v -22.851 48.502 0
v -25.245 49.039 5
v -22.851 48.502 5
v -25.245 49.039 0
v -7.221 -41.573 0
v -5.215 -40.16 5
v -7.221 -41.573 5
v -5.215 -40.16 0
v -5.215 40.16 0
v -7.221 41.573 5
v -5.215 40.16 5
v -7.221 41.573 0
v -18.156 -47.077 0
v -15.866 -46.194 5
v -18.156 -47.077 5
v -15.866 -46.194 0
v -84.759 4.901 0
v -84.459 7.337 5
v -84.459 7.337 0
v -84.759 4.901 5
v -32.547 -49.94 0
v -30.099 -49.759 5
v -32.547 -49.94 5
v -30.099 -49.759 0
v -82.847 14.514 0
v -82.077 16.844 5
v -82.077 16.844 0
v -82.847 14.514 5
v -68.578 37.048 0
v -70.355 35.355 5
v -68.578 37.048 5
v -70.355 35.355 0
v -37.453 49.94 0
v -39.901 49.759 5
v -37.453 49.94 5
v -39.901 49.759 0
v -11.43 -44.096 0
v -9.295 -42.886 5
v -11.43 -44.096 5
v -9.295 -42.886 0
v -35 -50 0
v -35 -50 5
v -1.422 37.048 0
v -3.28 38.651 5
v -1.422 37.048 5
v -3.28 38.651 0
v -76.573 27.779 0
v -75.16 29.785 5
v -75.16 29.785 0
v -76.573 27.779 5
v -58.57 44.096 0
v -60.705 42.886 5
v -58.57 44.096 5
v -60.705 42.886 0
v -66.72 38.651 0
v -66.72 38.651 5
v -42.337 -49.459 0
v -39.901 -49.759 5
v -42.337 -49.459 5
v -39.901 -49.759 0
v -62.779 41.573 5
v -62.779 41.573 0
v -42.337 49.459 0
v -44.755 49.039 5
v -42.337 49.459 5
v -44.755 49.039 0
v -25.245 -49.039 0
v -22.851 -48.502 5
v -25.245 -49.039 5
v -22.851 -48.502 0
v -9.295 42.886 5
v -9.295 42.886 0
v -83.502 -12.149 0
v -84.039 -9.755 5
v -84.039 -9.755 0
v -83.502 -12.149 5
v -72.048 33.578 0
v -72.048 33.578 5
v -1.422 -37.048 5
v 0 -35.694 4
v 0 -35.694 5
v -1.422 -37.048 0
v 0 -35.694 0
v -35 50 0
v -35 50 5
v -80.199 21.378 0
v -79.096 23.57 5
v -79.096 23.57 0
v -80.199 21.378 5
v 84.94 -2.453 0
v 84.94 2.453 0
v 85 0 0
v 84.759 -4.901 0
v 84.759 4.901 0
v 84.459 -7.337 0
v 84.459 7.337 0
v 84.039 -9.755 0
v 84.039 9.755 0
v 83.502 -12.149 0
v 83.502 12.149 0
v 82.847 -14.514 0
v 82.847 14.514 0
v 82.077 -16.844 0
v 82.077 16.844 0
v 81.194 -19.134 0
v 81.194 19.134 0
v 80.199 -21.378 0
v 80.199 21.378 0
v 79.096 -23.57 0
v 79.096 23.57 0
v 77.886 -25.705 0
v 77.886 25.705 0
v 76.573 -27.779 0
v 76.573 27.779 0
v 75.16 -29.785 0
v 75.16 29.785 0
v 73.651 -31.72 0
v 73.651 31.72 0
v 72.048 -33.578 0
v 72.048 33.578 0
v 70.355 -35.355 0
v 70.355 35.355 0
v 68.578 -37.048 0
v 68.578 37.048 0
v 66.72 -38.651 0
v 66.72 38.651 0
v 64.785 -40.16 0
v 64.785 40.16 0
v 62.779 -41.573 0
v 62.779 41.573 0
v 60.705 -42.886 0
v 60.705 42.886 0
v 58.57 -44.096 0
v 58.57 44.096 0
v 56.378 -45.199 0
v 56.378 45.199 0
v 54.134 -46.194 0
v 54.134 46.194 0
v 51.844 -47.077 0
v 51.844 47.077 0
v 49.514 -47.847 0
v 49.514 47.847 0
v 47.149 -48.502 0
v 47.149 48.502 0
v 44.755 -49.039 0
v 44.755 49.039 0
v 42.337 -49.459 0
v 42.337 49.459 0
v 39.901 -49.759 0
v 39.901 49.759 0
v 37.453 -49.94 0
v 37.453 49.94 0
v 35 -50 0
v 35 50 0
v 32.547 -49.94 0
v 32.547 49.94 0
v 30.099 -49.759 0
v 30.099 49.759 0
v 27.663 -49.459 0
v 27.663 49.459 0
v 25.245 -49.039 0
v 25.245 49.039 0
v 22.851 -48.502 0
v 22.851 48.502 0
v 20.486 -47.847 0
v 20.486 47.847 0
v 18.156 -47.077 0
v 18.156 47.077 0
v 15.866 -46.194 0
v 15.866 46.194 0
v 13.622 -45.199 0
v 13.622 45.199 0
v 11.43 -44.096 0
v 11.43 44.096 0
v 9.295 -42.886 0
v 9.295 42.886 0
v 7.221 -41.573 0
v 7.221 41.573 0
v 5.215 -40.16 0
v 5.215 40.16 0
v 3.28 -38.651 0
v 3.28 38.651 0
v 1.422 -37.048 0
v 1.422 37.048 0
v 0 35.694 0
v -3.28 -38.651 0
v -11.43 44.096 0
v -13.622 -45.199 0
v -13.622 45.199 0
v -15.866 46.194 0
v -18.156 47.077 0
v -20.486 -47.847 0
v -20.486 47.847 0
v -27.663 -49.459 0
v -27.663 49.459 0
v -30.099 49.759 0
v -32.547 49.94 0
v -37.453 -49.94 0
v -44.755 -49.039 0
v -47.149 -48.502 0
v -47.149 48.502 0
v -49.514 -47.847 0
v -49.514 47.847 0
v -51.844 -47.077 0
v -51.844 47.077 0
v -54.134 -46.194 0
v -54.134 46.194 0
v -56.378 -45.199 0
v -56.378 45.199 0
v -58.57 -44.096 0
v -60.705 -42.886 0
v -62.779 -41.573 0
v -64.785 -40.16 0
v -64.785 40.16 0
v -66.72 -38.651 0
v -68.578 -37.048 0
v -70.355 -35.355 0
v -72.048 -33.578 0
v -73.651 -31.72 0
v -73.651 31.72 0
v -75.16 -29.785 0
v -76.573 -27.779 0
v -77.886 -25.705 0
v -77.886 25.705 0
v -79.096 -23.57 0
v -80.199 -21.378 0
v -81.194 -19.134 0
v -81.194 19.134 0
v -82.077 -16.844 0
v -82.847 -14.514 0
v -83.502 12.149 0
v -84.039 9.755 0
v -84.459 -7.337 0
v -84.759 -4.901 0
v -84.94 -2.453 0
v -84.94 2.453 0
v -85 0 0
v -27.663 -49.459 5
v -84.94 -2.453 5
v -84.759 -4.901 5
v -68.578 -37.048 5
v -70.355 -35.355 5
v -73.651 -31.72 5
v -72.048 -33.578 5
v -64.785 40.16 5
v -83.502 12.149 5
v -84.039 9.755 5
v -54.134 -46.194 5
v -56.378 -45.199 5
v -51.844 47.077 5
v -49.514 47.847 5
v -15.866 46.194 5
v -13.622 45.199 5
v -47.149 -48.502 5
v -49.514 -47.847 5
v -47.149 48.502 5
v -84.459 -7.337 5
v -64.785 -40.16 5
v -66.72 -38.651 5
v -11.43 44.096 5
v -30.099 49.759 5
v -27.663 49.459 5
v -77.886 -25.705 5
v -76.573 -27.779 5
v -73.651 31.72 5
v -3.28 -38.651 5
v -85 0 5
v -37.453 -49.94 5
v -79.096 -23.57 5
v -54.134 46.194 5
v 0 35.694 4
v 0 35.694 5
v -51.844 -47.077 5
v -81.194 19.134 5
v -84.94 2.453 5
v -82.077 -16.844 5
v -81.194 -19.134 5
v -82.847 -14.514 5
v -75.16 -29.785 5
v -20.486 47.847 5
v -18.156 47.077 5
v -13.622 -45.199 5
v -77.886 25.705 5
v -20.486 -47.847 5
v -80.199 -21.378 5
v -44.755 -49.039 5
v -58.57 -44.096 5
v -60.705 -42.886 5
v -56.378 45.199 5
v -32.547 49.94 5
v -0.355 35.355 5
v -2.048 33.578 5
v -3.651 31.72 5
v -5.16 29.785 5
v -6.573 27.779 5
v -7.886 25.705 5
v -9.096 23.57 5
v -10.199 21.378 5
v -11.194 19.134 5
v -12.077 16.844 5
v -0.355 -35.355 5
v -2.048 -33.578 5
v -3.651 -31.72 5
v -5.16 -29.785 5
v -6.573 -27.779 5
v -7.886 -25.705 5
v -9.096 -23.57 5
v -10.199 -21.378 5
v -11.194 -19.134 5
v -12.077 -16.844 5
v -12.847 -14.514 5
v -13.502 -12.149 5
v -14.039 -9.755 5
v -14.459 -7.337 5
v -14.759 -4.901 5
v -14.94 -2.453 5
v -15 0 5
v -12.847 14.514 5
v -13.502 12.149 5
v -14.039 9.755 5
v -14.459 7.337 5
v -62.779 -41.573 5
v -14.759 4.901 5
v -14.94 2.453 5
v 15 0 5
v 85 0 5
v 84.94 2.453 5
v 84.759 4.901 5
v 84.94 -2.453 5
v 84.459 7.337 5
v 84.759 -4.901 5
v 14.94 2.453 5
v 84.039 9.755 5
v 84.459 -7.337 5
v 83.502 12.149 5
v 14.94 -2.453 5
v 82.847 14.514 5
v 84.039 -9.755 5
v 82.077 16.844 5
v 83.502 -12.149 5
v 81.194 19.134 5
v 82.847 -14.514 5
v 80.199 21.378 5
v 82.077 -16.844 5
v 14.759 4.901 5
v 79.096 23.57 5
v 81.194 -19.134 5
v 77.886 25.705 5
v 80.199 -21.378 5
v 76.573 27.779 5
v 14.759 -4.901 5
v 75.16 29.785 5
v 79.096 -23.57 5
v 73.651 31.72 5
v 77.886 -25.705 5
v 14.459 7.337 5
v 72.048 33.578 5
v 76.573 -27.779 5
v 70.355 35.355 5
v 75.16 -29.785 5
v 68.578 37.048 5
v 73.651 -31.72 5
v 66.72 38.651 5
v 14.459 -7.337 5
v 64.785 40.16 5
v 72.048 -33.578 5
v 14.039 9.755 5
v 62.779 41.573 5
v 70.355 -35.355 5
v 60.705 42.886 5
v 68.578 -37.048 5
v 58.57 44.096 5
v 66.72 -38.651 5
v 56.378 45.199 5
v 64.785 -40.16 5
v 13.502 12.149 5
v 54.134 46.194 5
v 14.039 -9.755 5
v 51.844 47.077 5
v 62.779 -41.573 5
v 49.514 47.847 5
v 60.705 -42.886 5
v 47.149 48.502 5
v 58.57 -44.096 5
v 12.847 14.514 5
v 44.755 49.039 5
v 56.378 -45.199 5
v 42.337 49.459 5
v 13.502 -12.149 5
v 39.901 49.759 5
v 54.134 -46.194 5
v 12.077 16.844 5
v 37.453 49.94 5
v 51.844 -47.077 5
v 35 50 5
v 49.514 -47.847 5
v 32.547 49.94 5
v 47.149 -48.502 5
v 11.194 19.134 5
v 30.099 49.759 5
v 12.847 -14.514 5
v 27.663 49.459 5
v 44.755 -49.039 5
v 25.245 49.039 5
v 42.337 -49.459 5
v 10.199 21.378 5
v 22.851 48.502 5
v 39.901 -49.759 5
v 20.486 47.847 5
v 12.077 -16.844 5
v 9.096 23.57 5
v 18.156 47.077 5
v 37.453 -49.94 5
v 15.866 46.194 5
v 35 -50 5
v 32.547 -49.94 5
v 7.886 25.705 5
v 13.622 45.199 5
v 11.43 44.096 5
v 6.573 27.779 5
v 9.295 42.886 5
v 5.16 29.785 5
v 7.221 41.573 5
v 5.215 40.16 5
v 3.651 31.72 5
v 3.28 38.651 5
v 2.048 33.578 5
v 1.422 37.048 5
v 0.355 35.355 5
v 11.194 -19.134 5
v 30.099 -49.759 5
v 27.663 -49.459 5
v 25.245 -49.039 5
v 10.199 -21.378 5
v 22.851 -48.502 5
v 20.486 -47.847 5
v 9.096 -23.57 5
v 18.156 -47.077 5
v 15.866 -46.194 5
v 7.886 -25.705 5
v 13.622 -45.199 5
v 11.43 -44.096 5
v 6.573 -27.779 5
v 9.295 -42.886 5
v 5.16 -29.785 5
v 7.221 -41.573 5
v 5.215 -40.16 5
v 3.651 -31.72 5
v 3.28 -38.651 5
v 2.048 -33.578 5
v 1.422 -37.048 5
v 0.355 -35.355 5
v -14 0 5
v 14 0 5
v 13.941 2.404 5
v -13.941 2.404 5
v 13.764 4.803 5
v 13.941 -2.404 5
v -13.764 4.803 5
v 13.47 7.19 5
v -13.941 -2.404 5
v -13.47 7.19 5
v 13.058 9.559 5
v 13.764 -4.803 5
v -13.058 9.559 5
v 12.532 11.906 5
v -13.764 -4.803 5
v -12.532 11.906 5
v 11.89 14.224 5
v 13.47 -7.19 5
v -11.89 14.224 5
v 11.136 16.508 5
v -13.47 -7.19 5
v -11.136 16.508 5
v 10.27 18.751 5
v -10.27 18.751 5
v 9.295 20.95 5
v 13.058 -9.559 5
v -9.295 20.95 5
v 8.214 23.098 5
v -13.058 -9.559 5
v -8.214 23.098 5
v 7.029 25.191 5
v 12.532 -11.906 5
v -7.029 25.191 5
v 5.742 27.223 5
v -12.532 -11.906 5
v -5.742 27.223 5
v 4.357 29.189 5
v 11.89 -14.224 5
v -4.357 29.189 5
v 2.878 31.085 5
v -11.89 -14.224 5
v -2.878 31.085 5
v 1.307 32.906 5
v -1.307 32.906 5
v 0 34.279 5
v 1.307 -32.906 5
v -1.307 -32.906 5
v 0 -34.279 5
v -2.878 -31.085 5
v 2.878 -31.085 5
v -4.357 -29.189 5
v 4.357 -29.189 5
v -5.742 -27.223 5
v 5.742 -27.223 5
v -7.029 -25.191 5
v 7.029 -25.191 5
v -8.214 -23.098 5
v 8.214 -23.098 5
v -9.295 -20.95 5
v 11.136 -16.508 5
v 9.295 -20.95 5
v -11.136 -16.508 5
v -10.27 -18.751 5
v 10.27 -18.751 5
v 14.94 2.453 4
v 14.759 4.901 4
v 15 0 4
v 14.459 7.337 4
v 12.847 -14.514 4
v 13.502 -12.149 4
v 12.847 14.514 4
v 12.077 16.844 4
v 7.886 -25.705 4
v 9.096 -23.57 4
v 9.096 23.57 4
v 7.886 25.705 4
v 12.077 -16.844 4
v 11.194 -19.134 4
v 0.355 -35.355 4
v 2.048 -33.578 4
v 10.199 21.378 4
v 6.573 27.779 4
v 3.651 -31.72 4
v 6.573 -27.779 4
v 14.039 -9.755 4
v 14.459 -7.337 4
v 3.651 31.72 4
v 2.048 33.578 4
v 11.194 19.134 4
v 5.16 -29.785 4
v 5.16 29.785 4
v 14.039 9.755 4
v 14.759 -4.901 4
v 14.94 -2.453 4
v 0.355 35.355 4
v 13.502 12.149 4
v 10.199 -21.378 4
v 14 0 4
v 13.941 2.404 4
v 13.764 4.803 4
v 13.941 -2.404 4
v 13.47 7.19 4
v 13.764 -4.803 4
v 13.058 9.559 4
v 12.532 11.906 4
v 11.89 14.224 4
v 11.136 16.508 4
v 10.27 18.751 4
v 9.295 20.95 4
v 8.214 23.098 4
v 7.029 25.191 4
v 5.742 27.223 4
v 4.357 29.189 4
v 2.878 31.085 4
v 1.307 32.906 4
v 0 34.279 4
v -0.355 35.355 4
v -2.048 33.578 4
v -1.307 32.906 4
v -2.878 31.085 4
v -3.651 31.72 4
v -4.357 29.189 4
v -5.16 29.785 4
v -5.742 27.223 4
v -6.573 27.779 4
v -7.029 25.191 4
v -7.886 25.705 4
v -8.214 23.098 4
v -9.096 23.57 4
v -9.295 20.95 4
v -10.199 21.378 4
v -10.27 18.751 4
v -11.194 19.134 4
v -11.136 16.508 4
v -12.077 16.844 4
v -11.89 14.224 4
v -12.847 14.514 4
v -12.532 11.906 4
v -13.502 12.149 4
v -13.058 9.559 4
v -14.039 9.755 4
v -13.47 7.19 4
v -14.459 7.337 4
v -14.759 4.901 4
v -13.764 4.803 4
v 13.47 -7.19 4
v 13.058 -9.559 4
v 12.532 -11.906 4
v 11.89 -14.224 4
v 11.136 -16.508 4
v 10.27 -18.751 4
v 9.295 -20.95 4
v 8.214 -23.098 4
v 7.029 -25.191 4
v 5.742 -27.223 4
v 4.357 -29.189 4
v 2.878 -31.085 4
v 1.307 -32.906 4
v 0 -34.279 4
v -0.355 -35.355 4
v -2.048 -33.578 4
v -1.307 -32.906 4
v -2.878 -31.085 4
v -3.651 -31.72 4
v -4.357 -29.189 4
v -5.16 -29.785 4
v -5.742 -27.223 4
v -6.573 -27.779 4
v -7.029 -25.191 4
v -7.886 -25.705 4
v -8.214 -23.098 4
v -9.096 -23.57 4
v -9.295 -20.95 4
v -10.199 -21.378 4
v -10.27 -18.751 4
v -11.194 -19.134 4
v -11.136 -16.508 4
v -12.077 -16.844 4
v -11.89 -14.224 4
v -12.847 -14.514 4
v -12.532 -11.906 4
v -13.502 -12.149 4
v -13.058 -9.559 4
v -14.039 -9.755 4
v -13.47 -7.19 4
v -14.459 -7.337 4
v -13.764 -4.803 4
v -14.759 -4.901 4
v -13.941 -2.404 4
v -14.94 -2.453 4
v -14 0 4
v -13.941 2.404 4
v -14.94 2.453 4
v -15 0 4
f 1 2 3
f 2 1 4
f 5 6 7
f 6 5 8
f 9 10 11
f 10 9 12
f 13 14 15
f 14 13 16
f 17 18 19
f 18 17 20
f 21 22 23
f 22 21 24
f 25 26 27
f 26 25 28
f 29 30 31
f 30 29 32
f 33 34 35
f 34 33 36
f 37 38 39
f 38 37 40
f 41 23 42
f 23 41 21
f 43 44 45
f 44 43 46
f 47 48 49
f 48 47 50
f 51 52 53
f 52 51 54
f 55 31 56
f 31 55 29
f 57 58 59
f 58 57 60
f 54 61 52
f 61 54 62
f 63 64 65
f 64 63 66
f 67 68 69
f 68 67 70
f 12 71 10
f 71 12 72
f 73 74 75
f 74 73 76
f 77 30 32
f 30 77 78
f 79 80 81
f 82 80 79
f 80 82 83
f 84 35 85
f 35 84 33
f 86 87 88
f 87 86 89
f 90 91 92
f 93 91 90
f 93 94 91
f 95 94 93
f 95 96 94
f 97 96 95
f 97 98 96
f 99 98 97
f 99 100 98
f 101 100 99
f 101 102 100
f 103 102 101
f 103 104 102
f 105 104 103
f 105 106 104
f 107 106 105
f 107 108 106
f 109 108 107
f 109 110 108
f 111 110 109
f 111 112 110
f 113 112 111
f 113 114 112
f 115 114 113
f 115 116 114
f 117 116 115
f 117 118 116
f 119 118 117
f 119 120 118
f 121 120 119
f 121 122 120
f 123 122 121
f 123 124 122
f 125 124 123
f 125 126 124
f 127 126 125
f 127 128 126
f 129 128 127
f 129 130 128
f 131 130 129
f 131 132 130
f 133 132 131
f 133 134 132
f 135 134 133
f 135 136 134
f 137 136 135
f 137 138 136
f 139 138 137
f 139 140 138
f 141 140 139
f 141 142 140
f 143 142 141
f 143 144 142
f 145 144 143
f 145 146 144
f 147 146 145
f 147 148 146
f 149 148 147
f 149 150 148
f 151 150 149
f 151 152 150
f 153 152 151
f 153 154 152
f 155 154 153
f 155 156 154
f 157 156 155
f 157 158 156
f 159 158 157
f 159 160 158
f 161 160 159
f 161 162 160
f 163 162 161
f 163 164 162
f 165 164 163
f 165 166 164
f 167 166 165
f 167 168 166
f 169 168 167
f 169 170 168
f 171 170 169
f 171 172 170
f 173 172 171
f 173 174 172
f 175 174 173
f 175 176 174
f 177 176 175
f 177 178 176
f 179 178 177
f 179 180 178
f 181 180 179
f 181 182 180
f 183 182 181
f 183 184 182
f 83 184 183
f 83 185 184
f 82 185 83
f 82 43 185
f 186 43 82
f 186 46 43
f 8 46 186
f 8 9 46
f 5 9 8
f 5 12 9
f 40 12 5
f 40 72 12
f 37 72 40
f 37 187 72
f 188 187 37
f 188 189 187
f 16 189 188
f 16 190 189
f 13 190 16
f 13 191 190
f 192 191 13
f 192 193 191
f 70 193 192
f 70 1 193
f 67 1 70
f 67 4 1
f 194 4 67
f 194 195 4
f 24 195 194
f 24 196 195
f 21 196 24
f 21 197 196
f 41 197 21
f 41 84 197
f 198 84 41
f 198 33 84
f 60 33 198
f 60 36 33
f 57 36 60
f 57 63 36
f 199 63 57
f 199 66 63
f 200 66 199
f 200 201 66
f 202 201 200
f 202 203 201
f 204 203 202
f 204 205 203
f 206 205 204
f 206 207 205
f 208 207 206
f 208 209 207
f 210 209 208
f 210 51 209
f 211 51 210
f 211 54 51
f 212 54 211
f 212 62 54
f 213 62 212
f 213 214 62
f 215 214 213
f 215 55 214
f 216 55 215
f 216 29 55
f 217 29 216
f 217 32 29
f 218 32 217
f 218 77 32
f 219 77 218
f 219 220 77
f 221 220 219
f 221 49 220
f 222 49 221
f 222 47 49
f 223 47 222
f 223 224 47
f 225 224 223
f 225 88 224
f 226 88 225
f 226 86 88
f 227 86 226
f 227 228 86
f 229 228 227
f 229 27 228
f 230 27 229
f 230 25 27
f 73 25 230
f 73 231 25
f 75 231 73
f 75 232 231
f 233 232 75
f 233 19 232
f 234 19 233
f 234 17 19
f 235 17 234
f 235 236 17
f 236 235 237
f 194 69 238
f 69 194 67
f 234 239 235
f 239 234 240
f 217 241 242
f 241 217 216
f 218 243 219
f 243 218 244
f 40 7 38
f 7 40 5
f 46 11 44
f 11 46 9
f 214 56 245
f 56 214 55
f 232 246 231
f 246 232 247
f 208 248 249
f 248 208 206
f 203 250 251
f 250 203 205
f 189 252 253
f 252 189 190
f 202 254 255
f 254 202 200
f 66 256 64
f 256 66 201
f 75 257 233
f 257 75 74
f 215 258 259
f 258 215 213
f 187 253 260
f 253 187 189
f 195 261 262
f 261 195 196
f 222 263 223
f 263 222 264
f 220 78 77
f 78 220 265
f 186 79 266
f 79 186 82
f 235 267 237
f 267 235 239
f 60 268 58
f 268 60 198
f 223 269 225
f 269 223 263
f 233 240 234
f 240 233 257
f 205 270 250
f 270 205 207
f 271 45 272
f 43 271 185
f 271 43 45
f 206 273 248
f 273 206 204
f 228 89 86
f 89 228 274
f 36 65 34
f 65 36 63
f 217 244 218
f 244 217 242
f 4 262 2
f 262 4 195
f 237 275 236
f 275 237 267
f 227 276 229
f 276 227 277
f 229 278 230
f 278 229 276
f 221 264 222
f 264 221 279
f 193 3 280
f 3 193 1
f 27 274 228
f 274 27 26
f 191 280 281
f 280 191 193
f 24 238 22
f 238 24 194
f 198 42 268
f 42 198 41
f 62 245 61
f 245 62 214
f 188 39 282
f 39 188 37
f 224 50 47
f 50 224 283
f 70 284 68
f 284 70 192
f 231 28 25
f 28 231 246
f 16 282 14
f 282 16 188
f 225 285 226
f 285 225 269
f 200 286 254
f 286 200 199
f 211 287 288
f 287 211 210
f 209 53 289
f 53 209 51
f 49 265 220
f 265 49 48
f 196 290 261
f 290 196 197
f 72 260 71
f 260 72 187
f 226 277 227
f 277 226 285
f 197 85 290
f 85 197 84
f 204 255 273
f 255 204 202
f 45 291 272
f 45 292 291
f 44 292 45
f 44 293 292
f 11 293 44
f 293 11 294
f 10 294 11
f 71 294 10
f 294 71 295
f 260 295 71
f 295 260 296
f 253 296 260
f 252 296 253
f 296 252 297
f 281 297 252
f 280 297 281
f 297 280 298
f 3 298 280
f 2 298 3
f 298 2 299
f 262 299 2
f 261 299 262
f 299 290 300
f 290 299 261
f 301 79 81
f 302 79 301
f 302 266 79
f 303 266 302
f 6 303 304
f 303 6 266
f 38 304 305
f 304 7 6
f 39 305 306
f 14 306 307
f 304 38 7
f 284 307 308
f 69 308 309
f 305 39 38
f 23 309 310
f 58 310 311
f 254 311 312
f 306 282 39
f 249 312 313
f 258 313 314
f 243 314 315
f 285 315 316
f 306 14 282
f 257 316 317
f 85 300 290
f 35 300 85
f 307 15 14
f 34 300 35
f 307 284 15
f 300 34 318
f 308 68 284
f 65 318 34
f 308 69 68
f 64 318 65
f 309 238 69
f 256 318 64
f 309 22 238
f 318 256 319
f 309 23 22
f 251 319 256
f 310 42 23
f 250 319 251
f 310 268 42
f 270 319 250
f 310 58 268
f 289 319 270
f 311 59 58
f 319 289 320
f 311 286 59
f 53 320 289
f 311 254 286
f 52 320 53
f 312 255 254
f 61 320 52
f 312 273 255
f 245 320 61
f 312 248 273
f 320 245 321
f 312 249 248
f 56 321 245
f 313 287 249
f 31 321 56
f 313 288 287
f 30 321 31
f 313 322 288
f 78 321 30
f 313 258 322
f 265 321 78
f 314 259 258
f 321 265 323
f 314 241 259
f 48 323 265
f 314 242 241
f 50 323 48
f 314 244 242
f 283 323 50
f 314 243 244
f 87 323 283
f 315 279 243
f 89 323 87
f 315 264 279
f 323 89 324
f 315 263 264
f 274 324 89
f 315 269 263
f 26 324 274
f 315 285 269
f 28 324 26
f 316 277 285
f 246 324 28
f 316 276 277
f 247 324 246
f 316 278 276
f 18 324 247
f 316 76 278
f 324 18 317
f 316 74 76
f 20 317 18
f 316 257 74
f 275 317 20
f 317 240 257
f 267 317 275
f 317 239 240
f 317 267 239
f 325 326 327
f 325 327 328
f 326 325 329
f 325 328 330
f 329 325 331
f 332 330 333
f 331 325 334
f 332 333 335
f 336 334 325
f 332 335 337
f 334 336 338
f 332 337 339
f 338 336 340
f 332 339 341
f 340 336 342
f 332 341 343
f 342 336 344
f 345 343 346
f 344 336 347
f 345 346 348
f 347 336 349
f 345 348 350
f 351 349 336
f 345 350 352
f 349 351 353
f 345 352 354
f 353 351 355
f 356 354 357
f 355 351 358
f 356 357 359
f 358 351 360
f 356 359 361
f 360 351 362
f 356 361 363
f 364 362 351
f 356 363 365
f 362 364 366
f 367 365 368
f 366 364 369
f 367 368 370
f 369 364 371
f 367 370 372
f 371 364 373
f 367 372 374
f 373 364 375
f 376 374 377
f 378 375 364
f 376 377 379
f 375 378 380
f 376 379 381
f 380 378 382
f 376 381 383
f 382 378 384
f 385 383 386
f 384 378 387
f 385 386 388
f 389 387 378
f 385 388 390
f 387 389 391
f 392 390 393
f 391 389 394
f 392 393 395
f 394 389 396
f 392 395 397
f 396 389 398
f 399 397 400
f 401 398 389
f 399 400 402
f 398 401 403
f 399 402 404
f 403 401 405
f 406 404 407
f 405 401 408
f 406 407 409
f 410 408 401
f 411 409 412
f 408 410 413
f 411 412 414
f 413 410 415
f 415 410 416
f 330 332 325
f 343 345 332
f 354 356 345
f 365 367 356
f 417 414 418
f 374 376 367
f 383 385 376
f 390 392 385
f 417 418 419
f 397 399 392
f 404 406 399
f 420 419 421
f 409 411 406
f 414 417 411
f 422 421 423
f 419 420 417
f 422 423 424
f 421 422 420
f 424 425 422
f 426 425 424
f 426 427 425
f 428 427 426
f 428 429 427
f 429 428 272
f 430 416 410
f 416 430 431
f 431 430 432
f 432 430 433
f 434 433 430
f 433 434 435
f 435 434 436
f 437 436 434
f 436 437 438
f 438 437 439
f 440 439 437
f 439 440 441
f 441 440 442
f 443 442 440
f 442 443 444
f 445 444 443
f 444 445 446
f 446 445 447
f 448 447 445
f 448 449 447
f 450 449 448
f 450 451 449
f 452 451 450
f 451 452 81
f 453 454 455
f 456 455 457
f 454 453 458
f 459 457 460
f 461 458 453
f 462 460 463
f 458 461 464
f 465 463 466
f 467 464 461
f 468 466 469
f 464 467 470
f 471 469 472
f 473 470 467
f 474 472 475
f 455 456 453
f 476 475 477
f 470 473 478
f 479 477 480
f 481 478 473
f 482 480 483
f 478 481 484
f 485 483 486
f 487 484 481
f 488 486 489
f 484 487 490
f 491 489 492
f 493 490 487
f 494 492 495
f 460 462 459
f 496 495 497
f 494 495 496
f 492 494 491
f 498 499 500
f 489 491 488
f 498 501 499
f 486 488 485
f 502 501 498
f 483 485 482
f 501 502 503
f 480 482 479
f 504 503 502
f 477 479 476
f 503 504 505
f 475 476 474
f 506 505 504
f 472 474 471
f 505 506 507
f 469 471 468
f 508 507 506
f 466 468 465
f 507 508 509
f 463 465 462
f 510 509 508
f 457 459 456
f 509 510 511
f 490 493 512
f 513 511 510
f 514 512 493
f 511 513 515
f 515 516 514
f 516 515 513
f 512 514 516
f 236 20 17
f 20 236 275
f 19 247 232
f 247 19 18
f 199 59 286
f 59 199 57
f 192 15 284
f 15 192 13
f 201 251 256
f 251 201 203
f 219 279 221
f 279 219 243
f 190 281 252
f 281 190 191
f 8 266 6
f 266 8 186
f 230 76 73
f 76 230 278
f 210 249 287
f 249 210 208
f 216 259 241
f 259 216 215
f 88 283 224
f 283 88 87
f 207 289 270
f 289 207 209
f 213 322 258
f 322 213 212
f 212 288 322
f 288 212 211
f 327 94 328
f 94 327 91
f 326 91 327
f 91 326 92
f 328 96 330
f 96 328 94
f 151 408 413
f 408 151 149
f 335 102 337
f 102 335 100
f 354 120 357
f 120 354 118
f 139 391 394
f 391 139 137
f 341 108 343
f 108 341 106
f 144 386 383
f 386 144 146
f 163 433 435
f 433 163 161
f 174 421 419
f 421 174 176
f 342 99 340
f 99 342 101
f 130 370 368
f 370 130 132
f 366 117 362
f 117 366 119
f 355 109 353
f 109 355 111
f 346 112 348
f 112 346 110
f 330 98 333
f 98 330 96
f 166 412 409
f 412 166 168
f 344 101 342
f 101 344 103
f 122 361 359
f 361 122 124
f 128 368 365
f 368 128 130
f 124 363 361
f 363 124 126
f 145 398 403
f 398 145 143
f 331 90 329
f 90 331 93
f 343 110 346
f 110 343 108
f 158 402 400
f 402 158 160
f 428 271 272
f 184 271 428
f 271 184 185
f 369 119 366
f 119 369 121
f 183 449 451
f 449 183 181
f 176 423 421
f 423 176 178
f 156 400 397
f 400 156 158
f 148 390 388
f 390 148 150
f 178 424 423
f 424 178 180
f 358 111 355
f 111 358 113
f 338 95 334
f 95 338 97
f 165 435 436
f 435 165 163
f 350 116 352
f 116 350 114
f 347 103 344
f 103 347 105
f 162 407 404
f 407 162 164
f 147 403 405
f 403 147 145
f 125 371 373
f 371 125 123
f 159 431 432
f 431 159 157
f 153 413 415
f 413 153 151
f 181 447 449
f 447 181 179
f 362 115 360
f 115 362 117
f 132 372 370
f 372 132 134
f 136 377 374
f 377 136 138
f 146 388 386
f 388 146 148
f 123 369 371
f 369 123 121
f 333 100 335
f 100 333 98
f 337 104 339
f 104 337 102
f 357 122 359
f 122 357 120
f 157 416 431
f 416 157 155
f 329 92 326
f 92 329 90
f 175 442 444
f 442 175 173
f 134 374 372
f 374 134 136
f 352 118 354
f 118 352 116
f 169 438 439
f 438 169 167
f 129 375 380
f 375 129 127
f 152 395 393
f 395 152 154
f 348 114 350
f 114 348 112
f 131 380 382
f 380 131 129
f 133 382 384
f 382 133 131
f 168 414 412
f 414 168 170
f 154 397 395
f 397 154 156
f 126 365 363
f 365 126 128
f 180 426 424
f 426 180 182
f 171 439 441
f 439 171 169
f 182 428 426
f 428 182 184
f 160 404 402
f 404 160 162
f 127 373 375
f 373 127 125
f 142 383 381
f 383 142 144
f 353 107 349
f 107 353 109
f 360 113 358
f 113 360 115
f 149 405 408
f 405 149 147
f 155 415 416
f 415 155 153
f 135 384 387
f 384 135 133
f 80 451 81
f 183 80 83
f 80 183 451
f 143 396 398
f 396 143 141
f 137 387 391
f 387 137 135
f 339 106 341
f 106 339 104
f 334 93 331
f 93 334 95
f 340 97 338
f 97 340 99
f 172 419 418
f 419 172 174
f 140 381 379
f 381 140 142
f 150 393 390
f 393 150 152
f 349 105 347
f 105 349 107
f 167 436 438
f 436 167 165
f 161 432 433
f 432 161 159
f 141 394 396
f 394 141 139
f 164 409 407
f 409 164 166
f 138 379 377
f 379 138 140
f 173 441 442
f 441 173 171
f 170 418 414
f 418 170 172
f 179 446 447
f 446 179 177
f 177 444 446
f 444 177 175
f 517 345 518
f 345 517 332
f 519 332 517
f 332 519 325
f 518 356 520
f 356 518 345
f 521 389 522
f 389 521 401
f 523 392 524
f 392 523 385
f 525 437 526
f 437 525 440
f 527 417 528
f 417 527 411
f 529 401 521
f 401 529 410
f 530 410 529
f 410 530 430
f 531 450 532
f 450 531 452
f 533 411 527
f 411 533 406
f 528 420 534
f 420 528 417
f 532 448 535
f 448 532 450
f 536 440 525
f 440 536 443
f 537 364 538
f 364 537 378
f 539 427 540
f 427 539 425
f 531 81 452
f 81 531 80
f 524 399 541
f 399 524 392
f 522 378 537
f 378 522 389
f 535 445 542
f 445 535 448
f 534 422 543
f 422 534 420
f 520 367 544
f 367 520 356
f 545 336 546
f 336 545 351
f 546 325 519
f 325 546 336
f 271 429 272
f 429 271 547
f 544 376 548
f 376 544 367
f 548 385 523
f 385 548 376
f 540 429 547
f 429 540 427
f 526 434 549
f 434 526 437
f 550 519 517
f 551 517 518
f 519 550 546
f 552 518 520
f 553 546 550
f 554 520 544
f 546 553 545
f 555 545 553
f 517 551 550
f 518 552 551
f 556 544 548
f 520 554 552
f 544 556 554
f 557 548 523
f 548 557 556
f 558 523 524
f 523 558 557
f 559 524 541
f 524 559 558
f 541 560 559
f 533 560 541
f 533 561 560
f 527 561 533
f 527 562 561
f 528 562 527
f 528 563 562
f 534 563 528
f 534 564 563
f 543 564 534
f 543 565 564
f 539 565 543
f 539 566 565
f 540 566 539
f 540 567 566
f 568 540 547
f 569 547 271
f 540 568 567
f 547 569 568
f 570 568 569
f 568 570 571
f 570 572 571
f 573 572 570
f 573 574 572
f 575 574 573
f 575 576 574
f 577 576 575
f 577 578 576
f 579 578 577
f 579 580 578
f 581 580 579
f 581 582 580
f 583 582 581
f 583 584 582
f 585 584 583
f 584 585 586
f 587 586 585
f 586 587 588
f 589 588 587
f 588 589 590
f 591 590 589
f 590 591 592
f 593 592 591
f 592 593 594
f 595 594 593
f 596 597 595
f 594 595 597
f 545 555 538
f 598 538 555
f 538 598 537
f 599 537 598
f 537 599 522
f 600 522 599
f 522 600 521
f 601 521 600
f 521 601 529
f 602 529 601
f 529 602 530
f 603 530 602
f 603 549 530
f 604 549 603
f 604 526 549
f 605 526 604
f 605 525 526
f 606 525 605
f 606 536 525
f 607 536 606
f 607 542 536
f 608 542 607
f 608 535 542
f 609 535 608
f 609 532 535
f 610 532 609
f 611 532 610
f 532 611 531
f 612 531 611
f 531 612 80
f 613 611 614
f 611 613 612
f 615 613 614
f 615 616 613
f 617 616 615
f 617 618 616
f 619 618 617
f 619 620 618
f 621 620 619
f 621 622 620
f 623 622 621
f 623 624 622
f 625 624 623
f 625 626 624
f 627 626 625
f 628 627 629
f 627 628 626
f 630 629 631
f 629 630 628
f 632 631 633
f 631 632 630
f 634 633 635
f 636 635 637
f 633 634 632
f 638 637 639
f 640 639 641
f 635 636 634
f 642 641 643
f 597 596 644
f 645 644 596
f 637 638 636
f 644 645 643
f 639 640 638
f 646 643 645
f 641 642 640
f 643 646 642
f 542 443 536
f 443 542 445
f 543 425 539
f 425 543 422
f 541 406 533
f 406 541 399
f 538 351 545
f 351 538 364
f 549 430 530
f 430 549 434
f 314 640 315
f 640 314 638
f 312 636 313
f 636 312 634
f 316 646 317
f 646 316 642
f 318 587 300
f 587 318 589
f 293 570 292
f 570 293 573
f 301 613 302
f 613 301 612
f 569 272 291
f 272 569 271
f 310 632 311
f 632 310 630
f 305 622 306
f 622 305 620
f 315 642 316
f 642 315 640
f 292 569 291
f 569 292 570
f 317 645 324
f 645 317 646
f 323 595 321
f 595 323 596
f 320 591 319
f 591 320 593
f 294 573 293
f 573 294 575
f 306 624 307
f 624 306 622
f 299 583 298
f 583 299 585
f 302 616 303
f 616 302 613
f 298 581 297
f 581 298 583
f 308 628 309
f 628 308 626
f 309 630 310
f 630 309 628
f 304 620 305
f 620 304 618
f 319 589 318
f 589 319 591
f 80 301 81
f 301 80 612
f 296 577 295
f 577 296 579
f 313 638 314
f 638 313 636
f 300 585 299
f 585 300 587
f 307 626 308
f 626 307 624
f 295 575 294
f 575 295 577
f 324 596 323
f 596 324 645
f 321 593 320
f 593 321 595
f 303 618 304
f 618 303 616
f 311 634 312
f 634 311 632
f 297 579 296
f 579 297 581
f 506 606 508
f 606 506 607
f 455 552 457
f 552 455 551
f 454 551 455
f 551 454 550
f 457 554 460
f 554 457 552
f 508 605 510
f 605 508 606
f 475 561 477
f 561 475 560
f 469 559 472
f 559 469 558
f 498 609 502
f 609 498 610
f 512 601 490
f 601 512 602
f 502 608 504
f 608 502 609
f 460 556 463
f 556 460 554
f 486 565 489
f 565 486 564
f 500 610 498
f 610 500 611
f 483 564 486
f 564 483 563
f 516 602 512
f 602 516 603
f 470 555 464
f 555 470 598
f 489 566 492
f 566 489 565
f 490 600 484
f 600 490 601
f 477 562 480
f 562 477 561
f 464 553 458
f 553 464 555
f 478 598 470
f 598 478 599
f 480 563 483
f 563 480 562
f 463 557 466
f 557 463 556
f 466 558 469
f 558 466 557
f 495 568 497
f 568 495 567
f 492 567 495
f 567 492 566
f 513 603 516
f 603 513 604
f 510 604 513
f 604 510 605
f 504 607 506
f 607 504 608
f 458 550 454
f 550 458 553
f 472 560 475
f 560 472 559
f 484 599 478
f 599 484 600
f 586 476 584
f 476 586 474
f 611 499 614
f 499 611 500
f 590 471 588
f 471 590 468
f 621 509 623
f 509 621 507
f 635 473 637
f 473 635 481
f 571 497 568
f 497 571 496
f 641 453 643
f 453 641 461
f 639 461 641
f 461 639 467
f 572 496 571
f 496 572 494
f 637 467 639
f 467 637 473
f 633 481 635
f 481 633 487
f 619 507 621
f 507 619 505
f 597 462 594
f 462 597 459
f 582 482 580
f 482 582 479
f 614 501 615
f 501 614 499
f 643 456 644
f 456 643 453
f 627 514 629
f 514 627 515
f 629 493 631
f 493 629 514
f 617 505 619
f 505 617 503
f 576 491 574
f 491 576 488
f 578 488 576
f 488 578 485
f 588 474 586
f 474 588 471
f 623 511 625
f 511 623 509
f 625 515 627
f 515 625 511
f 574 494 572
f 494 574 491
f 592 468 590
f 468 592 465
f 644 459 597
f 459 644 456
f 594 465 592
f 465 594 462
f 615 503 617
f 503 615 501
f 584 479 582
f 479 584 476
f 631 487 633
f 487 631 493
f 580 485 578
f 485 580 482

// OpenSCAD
$fn = 128;

module OverlapPiece(r1, r2, height, moveDistance)
{
	intersection()
	{
		translate([-moveDistance, 0, 0]) cylinder(r = r2, h = height); // Circle 1
		translate([ moveDistance, 0, 0]) cylinder(r = r2, h = height); // Circle 2
	}
}

module VennDiagram(r1 = 50, r2 = 50, height = 5, intersectPercentage = 30, border = 1)
{
	moveDistance = (r1 + r2) / 2 / 100 * (100 - intersectPercentage);

	difference()
	{
		union()
		{
			translate([-moveDistance, 0, 0]) cylinder(r = r1, h = height); // Circle 1
			translate([ moveDistance, 0, 0]) cylinder(r = r2, h = height); // Circle 2
		}

		translate([(r1 - r2) / 2, 0, height - border])
		difference()
		{
			OverlapPiece(r1, r2, border, moveDistance);
			OverlapPiece(r1 - border, r2 - border, border, moveDistance);
		}
	}
}

module SplitVennDiagram(r1 = 50, r2 = 50, height = 5, intersectPercentage = 60)
{
	moveDistance = (r1 + r2) / 2 / 100 * (100 - intersectPercentage);

	translate([-r1, 0, 0])
	difference()
	{
		translate([-moveDistance, 0, 0]) cylinder(r = r1, h = height); // Circle 1
		translate([ moveDistance, 0, 0]) cylinder(r = r2, h = height); // Circle 2
	}

	translate([r2, 0, 0])
	difference()
	{
		translate([ moveDistance, 0, 0]) cylinder(r = r2, h = height); // Circle 2
		translate([-moveDistance, 0, 0]) cylinder(r = r1, h = height); // Circle 1
	}

	// Middle piece
	OverlapPiece(r1, r2, height, moveDistance);
}

VennDiagram();

//SplitVennDiagram();
